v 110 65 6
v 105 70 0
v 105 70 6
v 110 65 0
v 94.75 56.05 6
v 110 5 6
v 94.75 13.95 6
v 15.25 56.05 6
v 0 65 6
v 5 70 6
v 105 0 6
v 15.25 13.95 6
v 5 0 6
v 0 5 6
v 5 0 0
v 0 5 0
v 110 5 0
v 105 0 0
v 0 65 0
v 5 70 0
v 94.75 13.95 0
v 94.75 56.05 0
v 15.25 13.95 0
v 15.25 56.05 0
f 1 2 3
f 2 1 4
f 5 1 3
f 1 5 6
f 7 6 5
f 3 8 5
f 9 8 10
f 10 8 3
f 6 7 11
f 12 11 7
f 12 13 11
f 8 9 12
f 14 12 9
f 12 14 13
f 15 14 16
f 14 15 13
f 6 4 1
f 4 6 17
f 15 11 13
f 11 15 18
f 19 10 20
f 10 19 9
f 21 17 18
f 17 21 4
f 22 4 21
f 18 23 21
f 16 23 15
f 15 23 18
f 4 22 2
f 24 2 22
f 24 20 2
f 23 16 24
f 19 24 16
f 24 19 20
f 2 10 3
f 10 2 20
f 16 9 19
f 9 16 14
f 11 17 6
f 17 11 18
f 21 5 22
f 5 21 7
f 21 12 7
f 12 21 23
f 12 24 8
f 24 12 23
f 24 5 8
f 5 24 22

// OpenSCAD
$fn = 32;

// ----------------------------------------------------------------------
// Windowed plate: 1 voids, 110 x 70 x 6 mm
// ----------------------------------------------------------------------

// --- parameters (mm) ---
plate_l = 110;            // plate length, X
plate_w = 70;             // plate width, Y
plate_t = 6;              // plate thickness, Z
edge_margin = 8;          // wall from the plate edge to any window
win1_l = 79.5;            // window length
win1_w = 42.1;            // window width
depth_1 = 6;              // depth of void 1 (full thickness = through)
corner_c = 5;             // corner chamfer of the plate

profile = [[5, 0], [105, 0], [110, 5], [110, 65], [105, 70], [5, 70], [0, 65], [0, 5]];  // primary outline, 8 points, counter clockwise
void_1 = [[15.25, 13.95], [94.75, 13.95], [94.75, 56.05], [15.25, 56.05]];  // large central window, 4 points

// --- the one profile operation ---
difference() {
  linear_extrude(height = plate_t) polygon(points = profile);
  translate([0, 0, -1])
    linear_extrude(height = plate_t + 2) polygon(points = void_1);
}
